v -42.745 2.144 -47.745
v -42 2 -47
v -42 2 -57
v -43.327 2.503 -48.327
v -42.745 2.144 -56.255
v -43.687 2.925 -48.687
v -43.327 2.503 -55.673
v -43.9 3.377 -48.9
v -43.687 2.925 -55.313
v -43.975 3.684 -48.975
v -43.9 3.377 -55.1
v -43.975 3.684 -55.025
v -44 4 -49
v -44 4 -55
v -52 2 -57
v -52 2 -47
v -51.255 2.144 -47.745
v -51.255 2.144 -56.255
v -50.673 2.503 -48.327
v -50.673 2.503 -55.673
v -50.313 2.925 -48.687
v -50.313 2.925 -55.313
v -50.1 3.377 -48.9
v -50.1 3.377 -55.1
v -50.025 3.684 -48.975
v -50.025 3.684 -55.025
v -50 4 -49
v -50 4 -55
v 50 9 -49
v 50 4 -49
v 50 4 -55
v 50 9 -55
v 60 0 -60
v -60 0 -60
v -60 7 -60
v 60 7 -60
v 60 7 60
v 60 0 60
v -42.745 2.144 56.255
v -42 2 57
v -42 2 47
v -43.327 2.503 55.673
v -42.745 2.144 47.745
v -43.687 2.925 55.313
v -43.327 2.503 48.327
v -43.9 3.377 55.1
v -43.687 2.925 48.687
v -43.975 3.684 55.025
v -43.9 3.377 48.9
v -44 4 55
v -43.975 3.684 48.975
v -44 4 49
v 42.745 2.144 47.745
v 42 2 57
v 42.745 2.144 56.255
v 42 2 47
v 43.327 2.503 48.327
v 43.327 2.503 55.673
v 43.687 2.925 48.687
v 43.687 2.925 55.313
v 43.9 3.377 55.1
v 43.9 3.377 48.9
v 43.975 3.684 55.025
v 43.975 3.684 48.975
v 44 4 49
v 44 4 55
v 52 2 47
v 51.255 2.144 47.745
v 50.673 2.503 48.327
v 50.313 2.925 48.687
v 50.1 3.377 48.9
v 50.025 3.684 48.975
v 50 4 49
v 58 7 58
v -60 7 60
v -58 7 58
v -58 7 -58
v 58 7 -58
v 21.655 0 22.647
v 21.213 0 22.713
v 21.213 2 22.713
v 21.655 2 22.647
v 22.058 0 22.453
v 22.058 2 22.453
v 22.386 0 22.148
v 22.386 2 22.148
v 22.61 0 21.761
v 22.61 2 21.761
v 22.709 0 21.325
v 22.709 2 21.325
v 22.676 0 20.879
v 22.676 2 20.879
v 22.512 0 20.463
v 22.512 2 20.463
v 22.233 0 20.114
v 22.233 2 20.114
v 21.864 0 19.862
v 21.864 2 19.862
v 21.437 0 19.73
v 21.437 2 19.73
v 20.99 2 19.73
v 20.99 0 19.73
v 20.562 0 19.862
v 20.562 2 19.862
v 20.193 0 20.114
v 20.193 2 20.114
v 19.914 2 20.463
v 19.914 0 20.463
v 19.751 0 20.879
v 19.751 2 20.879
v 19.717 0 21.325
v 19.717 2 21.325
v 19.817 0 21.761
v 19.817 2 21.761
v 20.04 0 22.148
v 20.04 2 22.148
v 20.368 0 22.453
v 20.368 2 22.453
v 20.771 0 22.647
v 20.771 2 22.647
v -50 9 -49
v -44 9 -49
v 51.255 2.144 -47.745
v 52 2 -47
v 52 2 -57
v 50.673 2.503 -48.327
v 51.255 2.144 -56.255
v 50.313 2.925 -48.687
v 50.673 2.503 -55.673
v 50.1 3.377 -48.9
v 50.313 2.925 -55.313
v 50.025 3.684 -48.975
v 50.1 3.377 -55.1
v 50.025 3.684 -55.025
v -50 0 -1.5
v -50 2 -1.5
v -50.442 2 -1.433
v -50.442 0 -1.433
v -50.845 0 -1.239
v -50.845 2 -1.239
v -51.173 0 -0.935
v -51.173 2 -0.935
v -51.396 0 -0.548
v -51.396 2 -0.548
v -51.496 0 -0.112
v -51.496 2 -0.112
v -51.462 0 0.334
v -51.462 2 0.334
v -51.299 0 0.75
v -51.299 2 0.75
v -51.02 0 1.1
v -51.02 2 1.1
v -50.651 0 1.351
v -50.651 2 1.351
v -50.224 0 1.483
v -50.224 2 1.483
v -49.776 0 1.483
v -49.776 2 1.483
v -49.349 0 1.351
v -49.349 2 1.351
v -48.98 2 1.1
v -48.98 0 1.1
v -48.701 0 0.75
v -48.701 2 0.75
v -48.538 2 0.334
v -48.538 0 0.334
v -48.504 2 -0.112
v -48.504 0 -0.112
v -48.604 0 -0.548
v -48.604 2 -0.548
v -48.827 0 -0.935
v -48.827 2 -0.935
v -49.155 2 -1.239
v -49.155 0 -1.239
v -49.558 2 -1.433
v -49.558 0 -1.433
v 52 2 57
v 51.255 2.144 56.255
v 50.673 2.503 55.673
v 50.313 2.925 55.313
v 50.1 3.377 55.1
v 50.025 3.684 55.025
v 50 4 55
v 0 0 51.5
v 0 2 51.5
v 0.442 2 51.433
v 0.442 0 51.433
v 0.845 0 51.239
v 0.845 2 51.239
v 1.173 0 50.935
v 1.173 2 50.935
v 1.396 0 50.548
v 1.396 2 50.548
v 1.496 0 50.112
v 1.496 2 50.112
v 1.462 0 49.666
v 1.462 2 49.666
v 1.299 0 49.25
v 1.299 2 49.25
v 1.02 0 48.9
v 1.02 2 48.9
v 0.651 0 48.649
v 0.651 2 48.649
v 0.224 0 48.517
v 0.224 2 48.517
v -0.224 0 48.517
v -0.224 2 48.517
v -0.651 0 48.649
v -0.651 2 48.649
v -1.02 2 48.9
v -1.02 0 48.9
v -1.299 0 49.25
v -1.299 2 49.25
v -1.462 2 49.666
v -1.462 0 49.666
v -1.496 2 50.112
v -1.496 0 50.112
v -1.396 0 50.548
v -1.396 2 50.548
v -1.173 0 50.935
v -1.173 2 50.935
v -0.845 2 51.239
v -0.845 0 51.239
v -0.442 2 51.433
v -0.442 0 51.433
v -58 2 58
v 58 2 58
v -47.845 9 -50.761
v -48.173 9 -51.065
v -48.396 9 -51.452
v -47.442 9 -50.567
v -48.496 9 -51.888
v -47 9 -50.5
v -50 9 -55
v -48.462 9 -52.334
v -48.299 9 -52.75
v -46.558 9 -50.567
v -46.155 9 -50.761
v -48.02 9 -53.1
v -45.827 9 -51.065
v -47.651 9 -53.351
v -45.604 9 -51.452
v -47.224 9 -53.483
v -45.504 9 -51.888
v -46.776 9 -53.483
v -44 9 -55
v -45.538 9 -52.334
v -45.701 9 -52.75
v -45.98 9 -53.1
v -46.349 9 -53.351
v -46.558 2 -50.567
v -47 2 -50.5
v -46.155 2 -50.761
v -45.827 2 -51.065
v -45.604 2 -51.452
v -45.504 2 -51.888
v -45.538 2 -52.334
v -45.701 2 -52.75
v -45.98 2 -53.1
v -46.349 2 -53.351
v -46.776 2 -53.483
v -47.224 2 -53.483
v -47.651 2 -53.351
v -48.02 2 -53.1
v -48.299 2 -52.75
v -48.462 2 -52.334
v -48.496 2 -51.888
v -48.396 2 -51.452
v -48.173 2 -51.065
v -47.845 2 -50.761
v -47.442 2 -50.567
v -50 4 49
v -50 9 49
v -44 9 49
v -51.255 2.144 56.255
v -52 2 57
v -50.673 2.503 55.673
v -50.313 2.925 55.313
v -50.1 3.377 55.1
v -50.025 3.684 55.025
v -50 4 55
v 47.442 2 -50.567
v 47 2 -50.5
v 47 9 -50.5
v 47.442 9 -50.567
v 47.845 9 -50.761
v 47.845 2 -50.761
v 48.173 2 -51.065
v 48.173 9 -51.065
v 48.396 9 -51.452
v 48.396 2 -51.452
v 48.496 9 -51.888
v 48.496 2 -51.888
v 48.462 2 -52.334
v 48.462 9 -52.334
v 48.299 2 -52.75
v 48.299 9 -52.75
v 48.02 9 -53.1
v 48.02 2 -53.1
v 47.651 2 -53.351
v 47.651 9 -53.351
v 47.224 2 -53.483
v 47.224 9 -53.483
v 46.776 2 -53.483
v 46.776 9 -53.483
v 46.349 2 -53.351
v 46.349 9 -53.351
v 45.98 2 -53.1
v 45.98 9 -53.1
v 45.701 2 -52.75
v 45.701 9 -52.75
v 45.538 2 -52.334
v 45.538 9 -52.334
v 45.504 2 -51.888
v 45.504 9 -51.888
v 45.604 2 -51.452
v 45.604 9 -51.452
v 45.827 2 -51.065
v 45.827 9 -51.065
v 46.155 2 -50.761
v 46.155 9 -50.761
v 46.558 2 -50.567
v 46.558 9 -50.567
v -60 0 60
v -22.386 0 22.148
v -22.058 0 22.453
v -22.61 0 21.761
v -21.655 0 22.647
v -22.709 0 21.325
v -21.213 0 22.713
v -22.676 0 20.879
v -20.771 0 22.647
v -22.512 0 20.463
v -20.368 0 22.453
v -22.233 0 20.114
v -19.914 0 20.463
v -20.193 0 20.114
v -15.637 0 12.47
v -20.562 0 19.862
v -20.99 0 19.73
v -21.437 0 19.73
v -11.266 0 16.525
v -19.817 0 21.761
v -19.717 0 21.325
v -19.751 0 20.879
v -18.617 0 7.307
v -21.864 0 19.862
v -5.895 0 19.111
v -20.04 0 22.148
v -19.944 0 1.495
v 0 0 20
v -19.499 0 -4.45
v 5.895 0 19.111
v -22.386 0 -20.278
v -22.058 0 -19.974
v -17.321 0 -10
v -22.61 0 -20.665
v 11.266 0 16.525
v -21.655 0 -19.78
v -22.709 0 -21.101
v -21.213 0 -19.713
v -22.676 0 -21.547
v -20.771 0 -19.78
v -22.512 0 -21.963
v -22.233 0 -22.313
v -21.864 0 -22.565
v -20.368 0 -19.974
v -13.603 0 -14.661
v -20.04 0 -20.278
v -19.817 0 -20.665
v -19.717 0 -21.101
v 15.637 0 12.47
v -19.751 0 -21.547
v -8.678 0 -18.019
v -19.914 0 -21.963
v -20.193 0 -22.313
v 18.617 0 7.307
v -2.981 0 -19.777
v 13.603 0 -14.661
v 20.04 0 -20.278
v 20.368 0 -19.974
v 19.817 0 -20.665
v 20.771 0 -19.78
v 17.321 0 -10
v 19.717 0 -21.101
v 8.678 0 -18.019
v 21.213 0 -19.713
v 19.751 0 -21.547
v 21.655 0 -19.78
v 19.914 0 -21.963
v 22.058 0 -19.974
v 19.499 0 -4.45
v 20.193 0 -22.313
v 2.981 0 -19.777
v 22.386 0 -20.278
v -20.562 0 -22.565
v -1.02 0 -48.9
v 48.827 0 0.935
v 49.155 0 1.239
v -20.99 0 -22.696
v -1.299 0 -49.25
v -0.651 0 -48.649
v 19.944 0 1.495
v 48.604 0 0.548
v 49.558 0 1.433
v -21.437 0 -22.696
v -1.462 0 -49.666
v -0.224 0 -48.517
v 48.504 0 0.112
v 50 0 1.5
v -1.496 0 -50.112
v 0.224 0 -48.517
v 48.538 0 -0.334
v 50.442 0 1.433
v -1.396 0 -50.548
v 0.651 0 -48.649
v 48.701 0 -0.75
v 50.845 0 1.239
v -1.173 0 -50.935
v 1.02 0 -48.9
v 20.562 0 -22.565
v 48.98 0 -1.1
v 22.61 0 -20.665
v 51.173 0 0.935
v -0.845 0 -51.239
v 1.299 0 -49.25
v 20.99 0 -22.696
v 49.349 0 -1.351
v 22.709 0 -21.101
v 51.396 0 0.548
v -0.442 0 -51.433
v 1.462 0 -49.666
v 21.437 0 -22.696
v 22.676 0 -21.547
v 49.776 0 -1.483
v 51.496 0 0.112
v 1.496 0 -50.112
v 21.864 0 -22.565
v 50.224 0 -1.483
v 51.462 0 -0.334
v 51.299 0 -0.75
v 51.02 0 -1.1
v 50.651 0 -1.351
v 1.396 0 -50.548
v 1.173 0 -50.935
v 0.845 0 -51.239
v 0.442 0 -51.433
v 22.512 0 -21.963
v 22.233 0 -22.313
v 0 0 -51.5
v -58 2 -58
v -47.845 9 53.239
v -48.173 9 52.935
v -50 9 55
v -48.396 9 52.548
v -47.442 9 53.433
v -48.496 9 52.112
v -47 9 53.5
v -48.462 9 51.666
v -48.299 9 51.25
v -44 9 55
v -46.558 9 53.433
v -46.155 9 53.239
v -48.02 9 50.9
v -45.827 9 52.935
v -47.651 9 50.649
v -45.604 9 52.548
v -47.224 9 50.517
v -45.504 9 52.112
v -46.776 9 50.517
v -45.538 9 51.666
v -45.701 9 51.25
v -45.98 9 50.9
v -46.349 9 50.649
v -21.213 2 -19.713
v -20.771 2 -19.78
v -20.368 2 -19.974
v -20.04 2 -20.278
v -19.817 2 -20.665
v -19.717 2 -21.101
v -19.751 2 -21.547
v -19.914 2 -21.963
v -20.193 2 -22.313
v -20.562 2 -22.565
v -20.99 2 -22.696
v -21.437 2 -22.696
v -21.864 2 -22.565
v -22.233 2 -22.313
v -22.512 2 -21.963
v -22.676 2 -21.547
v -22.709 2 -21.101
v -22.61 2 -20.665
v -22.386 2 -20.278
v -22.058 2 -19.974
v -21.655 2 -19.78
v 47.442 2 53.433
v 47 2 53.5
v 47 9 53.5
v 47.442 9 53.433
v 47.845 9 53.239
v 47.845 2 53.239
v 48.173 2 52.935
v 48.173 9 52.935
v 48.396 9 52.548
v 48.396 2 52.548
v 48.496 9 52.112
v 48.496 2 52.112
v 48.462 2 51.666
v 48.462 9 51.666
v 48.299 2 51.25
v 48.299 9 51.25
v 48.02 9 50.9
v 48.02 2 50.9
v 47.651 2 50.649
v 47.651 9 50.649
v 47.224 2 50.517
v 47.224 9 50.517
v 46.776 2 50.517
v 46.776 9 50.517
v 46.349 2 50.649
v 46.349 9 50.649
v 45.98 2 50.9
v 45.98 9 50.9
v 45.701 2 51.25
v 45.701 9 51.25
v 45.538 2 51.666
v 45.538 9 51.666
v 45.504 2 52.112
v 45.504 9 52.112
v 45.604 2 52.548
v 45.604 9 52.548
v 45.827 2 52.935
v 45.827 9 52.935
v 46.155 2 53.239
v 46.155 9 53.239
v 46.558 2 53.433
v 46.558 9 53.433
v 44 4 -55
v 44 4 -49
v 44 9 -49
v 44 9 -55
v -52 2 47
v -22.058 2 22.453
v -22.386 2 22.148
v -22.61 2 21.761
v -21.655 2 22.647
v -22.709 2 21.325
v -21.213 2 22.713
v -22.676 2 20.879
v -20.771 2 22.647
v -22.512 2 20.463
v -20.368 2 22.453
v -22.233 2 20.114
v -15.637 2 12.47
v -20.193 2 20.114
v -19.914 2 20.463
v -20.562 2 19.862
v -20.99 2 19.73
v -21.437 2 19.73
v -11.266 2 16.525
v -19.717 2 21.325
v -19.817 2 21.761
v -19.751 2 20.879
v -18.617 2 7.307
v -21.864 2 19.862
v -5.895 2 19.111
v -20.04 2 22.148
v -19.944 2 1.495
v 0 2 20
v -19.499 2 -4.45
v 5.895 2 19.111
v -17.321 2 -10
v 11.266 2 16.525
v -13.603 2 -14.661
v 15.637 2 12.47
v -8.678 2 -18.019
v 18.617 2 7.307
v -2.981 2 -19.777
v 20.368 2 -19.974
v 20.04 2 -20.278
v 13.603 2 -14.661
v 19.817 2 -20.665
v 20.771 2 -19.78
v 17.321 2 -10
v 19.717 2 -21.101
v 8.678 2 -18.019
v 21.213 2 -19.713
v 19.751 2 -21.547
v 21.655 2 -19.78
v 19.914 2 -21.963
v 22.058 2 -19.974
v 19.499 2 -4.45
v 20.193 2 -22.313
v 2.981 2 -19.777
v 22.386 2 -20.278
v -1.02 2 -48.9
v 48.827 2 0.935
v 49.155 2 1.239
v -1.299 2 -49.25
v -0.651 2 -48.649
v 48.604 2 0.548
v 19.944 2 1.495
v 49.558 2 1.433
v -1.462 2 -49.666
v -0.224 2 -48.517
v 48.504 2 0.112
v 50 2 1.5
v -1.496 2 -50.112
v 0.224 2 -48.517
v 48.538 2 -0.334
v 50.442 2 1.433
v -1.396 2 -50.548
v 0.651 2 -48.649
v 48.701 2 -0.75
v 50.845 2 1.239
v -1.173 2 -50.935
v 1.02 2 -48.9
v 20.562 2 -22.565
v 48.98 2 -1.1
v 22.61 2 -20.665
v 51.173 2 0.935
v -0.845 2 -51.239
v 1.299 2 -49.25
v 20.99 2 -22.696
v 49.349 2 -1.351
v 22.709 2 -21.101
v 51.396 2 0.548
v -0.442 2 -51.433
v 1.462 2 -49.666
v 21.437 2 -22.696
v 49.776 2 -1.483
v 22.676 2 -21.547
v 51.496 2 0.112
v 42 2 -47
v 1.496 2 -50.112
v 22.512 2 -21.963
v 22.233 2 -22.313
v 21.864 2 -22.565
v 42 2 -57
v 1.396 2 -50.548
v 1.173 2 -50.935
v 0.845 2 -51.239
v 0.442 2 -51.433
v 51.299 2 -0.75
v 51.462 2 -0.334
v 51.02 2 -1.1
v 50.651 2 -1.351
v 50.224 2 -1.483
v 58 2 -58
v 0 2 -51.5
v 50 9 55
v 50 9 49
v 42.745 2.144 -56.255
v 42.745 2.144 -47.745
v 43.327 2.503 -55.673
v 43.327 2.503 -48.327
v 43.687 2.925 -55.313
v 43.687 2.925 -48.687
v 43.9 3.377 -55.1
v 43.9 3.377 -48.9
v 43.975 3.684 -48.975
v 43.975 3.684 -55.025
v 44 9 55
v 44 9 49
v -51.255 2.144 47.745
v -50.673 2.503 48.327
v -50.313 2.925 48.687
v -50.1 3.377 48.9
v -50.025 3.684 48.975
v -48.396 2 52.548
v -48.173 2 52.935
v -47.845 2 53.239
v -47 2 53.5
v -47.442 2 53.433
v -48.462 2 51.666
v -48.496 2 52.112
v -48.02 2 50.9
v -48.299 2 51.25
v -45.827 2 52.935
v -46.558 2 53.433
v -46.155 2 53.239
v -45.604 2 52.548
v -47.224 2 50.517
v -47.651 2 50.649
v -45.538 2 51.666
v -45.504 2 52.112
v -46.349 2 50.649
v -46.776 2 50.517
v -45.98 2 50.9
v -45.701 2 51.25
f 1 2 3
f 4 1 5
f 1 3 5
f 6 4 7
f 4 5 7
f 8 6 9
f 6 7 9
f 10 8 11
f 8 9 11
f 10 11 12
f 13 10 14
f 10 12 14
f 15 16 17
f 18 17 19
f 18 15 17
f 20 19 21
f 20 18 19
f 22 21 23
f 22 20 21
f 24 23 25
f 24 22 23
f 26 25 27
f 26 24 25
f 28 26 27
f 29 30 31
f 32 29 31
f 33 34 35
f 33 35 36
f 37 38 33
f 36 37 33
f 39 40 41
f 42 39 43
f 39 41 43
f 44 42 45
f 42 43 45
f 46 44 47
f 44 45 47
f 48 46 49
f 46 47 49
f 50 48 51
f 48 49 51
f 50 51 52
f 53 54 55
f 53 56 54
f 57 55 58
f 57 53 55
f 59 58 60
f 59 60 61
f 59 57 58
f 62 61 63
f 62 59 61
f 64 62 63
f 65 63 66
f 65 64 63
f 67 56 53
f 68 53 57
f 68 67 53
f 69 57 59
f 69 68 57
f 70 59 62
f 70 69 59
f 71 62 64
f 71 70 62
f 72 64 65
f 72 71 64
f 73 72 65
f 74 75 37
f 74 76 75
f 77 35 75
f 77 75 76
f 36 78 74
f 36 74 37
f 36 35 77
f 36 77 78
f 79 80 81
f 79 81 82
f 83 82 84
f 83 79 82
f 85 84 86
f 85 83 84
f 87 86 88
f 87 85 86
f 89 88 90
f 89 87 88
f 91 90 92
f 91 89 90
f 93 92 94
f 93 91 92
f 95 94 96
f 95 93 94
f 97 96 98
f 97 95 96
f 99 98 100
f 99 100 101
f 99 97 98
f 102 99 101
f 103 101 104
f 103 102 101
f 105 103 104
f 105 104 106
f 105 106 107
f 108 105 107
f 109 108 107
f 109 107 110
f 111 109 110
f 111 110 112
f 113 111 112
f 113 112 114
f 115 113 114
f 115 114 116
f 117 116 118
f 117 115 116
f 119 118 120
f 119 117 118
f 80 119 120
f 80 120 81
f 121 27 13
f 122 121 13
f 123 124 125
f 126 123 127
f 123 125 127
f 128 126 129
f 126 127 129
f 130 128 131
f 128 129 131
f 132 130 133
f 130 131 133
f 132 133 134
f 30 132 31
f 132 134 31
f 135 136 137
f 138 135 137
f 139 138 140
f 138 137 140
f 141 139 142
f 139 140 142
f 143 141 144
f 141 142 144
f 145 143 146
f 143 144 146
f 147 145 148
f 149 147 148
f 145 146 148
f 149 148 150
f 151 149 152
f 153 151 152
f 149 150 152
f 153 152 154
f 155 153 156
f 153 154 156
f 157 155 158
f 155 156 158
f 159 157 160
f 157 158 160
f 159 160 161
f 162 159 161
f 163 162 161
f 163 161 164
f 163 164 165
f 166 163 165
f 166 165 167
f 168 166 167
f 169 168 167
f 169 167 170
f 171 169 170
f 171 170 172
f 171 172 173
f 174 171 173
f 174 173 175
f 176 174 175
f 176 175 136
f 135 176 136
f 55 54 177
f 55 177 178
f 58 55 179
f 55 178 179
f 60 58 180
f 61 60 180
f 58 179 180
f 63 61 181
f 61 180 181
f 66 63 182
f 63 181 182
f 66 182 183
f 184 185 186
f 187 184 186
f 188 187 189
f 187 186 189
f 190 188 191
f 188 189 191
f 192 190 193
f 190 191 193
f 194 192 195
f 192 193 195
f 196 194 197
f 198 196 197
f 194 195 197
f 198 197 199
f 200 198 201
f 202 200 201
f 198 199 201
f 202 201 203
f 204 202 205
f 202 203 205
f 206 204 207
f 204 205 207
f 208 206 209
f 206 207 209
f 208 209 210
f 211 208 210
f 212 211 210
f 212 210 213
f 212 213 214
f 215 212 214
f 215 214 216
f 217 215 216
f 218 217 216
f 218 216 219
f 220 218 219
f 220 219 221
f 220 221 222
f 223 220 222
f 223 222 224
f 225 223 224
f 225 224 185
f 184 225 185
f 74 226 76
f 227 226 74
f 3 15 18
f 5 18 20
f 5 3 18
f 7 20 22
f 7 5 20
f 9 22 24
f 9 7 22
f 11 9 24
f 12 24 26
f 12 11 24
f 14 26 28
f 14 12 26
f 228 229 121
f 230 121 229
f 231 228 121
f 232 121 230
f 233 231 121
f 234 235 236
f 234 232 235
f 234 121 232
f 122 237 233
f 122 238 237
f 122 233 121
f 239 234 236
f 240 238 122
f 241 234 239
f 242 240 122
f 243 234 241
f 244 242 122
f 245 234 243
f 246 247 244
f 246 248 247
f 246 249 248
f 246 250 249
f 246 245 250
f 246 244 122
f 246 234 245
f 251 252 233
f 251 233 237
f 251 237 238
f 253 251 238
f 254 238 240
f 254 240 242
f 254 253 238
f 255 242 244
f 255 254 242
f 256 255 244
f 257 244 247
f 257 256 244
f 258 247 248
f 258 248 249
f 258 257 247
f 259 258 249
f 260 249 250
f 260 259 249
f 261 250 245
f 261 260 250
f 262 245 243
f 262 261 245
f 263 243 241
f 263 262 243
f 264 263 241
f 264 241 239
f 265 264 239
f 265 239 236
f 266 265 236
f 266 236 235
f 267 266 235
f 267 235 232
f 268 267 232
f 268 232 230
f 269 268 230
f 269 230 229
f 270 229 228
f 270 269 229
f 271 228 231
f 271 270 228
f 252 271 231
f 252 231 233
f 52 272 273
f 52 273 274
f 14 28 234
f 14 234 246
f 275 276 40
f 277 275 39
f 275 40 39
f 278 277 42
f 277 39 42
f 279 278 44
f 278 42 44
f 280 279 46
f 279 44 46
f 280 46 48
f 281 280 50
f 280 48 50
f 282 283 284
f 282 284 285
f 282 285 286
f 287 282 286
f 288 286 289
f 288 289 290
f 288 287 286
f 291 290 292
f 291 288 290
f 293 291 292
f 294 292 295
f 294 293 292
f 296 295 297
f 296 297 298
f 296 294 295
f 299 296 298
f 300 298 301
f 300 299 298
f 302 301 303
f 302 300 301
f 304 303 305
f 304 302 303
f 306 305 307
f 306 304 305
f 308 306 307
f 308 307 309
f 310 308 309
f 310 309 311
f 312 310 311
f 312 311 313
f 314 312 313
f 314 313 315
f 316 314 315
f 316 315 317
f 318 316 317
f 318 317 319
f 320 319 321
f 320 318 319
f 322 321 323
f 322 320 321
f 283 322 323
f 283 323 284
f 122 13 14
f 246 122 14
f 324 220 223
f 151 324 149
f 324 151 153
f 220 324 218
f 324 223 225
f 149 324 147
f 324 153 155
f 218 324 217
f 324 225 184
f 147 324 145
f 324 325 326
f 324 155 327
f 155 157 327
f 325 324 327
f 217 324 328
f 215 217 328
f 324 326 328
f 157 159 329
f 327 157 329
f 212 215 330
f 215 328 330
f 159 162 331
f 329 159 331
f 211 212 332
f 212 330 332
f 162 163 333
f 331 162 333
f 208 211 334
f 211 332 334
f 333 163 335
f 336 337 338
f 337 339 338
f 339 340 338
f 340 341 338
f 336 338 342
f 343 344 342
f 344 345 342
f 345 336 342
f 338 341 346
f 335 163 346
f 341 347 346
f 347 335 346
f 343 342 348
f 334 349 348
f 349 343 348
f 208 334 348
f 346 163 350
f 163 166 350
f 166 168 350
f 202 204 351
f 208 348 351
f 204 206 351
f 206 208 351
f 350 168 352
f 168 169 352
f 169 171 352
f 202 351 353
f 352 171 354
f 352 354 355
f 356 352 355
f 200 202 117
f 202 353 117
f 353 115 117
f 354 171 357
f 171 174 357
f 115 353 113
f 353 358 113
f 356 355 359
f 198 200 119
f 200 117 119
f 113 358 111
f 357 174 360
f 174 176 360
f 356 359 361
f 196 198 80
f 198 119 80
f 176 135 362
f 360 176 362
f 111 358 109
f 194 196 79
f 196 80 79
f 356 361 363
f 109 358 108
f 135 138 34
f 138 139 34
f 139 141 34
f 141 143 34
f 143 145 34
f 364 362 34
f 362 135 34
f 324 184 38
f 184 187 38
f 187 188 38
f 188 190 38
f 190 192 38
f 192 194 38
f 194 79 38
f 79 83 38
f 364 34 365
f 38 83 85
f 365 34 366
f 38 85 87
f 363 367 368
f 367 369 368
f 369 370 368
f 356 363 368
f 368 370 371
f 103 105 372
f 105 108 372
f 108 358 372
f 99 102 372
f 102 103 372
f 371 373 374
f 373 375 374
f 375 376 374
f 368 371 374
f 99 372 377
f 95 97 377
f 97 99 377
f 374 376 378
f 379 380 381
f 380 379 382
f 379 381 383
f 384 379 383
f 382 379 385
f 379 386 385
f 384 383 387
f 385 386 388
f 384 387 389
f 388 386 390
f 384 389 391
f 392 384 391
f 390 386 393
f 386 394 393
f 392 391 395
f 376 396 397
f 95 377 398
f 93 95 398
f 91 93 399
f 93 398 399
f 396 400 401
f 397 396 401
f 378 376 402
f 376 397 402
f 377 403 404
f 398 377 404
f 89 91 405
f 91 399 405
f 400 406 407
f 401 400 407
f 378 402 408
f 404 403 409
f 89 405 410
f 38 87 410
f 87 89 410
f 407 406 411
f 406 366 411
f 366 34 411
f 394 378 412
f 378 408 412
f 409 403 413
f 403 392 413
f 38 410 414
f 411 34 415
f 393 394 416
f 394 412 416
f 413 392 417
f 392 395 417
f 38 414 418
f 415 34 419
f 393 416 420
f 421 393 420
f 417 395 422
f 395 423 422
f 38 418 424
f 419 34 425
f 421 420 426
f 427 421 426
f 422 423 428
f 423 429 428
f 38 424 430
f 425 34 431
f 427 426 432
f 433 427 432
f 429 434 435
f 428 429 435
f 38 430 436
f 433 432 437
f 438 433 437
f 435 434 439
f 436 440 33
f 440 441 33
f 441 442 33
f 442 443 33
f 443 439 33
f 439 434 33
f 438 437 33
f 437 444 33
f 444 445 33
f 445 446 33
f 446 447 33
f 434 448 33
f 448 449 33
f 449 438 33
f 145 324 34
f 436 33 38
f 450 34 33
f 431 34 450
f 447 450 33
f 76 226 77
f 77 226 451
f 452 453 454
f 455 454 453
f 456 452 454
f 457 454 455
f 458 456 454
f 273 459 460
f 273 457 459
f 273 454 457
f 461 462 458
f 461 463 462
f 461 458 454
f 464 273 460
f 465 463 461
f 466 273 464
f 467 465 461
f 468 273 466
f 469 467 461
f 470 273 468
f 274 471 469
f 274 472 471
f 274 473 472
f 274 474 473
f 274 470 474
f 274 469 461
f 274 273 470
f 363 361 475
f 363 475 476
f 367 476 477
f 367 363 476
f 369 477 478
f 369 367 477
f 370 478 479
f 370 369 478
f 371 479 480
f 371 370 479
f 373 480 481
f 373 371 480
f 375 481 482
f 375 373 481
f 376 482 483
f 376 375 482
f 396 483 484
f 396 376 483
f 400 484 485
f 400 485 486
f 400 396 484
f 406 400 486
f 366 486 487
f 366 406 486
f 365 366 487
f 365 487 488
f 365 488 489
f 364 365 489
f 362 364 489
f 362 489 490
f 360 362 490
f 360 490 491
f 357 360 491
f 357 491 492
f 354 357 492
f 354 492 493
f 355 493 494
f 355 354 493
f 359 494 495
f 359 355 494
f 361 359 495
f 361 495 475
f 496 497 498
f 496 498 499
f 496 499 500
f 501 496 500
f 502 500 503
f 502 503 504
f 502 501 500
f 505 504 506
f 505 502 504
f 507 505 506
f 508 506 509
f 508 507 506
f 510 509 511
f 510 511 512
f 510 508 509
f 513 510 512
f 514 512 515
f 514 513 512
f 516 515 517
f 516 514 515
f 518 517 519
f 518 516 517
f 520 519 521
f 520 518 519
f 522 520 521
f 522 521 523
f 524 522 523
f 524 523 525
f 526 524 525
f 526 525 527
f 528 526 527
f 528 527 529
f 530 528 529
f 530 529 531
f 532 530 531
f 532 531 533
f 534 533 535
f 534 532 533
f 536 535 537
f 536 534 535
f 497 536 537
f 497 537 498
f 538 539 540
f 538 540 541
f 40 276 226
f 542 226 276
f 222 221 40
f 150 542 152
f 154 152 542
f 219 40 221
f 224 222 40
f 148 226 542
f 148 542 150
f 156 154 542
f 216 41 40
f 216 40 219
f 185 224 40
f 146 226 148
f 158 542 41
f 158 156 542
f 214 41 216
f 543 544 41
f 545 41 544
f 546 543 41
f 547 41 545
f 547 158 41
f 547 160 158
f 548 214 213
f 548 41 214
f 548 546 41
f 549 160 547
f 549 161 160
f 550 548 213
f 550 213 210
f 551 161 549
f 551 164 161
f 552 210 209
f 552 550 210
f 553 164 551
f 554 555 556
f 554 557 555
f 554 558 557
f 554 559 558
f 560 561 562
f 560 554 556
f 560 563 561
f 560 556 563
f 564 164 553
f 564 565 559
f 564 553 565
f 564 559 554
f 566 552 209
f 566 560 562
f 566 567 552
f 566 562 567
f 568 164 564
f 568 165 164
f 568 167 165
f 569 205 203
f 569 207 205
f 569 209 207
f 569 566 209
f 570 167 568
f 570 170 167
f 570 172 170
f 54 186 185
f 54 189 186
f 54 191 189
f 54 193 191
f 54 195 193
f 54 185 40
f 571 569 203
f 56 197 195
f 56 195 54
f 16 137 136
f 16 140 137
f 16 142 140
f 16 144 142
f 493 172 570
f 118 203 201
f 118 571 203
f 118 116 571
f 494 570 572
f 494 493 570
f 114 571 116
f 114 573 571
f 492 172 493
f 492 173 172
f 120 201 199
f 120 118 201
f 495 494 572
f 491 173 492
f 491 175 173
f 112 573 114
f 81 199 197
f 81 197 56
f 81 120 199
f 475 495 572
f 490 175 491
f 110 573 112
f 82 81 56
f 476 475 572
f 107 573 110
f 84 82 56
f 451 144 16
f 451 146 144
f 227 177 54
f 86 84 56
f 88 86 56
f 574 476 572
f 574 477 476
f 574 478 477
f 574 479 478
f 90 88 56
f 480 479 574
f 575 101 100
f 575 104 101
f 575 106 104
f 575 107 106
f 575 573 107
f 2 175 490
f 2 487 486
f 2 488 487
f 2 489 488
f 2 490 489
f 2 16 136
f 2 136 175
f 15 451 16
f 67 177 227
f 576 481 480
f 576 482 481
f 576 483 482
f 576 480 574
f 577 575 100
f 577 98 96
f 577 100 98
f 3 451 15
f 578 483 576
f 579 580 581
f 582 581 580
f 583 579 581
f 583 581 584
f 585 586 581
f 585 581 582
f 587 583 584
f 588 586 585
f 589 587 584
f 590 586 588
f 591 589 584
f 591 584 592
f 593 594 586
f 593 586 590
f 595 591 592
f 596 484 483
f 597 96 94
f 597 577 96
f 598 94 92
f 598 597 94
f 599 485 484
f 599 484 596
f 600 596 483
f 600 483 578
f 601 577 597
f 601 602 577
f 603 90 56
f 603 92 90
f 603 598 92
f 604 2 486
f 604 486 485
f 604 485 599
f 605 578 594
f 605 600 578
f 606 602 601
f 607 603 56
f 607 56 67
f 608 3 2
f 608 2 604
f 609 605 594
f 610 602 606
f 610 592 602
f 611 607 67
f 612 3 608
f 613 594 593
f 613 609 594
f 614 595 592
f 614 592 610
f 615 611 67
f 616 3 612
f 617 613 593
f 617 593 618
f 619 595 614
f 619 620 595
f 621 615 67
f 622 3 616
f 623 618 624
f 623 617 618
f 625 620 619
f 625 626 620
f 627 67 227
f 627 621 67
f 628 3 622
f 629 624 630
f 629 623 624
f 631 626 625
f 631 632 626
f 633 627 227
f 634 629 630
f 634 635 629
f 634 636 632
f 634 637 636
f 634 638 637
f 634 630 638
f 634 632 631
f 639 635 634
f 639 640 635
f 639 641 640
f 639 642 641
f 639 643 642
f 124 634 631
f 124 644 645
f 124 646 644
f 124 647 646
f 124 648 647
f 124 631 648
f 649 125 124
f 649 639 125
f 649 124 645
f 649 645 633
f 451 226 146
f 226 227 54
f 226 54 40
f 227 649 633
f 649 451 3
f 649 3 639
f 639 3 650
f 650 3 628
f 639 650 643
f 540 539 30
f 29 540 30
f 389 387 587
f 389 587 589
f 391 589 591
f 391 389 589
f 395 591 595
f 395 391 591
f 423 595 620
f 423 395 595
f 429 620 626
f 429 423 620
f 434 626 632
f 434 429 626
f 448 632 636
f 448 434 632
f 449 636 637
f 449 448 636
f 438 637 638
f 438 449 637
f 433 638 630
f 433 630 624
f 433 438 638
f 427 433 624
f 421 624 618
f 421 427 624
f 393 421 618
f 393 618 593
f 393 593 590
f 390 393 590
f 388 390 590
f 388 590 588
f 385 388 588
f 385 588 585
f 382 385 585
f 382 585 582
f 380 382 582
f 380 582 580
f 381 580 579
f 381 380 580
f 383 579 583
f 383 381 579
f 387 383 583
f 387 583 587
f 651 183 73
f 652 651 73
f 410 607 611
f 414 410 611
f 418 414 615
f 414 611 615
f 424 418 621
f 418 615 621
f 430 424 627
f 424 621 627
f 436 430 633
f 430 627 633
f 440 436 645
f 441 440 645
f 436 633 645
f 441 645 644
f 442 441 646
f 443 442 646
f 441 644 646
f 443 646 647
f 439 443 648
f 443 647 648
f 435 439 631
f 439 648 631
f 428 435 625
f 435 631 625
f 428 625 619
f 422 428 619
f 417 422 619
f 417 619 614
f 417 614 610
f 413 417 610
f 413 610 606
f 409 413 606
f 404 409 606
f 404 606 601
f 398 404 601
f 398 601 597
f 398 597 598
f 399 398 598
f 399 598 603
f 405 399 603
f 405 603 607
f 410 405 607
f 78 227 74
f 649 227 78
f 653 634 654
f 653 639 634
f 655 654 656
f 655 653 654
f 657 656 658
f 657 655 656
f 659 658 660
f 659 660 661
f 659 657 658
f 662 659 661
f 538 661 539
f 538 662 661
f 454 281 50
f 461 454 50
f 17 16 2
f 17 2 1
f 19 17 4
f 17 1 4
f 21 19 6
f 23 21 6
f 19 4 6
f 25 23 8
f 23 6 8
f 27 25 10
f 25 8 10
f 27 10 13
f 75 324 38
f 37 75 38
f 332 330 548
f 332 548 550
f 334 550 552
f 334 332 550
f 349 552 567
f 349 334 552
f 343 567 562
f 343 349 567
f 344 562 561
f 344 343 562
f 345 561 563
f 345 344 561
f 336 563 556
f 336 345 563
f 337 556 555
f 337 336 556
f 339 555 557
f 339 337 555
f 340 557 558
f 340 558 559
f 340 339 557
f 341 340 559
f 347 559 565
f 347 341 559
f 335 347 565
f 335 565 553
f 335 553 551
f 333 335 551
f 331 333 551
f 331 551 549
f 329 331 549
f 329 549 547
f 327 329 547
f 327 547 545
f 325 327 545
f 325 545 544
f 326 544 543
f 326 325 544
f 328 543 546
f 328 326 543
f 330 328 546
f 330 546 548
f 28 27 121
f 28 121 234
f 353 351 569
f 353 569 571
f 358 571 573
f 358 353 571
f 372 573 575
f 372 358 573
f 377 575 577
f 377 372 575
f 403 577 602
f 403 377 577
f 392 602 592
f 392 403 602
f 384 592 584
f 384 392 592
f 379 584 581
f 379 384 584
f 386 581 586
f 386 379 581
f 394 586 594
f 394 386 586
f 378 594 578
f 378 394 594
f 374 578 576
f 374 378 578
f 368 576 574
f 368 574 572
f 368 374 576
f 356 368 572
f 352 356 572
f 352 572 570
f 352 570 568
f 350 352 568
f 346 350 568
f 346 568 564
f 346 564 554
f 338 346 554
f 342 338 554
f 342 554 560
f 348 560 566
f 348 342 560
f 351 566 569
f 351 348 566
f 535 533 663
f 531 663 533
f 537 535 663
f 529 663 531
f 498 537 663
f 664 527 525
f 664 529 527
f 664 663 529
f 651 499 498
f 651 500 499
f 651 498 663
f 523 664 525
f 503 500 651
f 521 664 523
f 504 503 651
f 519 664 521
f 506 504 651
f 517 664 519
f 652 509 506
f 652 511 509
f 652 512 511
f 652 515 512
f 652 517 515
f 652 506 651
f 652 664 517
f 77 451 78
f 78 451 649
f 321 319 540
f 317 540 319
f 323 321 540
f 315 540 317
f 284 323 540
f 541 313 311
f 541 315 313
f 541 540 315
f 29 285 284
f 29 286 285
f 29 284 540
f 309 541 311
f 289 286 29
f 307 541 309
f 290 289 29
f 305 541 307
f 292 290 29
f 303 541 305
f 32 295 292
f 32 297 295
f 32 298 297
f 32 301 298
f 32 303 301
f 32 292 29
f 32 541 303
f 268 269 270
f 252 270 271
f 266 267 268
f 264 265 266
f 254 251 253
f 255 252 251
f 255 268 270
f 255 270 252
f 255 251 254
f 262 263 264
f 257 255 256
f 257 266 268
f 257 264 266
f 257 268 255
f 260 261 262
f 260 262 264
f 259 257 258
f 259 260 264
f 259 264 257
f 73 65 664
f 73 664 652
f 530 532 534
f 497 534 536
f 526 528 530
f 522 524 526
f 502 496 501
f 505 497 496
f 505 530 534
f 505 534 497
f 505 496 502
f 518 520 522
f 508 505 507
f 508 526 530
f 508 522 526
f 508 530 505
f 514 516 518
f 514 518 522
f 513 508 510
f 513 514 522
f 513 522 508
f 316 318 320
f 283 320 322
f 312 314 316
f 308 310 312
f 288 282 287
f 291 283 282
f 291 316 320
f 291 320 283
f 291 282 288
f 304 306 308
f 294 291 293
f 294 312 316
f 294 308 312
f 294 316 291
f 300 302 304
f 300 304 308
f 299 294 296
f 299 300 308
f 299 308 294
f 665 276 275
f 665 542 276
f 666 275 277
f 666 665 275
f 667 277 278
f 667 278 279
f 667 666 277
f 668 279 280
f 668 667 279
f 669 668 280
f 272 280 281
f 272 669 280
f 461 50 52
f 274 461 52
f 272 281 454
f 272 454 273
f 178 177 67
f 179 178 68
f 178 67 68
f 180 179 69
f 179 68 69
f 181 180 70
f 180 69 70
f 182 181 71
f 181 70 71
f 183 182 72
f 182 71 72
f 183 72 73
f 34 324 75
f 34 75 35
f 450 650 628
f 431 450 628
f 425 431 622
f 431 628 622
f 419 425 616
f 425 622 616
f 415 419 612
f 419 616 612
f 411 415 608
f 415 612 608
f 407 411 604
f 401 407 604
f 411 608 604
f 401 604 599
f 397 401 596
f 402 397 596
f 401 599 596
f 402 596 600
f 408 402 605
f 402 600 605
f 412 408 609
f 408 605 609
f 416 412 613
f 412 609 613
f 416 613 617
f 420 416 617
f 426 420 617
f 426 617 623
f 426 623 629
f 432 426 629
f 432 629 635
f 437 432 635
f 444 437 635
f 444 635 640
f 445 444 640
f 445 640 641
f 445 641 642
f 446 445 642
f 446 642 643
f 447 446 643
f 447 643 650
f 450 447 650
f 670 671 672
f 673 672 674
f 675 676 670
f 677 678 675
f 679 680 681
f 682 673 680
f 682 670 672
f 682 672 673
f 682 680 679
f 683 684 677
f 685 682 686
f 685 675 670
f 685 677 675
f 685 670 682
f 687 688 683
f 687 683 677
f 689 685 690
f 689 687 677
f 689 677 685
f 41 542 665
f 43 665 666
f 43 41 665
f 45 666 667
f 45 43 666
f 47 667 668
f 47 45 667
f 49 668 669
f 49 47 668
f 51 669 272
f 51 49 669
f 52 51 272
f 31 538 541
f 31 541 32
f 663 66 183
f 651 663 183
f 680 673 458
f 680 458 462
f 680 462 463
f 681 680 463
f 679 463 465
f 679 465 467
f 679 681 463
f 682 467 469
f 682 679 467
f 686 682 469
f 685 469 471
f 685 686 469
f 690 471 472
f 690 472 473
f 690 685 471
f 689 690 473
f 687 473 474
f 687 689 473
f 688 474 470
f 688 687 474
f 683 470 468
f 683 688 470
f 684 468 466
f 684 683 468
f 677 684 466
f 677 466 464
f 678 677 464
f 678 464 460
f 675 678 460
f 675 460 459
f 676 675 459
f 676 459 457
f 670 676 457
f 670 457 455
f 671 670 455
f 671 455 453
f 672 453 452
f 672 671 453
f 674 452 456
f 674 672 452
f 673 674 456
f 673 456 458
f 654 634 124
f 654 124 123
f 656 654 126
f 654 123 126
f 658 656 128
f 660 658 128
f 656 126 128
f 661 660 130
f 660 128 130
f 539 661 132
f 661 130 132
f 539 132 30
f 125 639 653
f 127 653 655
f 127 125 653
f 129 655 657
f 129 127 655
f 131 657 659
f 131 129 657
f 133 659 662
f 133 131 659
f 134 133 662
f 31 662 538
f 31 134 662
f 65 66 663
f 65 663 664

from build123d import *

# Parameters (mm, degrees)
SKETCH1_W           = 116
SKETCH1_H           = 116
SKETCH1_R           = 1.5
SKETCH1_R_2         = 20
BOSS_EXTRUDE1_DEPTH = 2
SKETCH2_W           = 6
SKETCH2_H           = 6
SKETCH2_R           = 1.5
BOSS_EXTRUDE2_DEPTH = 7
SKETCH1_4_W         = 120
SKETCH1_4_H         = 120
SKETCH1_4_W_2       = 116
SKETCH1_4_H_2       = 116
BOSS_EXTRUDE3_DEPTH = 7
SKETCH3_R           = 1.5
CUT_EXTRUDE1_DEPTH  = 86.141059425
FILLET2_R           = 2


with BuildPart() as part:
    # Sketch1 → Boss-Extrude1 (new body)
    with BuildSketch(Plane(origin=(0, 0, 0), x_dir=(1, 0, 0), z_dir=(0, 1, 0))):
        Rectangle(SKETCH1_W, SKETCH1_H)
        with Locations((-21.213203436, -21.213203436)):
            Circle(SKETCH1_R, mode=Mode.SUBTRACT)
        with Locations((21.213203436, -21.213203436)):
            Circle(SKETCH1_R, mode=Mode.SUBTRACT)
        Circle(SKETCH1_R_2, mode=Mode.SUBTRACT)
        with Locations((-21.213203436, 21.213203436)):
            Circle(SKETCH1_R, mode=Mode.SUBTRACT)
        with Locations((21.213203436, 21.213203436)):
            Circle(SKETCH1_R, mode=Mode.SUBTRACT)
    extrude(amount=BOSS_EXTRUDE1_DEPTH)

    # Sketch2 → Boss-Extrude2 (add)
    # profile 1 of 4: a face of its own
    with BuildSketch(Plane(origin=(0, 2, 0), x_dir=(1, 0, 0), z_dir=(0, 1, 0))):
        with Locations((47, 52)):
            Rectangle(SKETCH2_W, SKETCH2_H)
        with Locations((47, 52)):
            Circle(SKETCH2_R, mode=Mode.SUBTRACT)
    # profile 2 of 4: a face of its own
    with BuildSketch(Plane(origin=(0, 2, 0), x_dir=(1, 0, 0), z_dir=(0, 1, 0))):
        with Locations((47, -52)):
            Rectangle(SKETCH2_W, SKETCH2_H)
        with Locations((47, -52)):
            Circle(SKETCH2_R, mode=Mode.SUBTRACT)
    # profile 3 of 4: a face of its own
    with BuildSketch(Plane(origin=(0, 2, 0), x_dir=(1, 0, 0), z_dir=(0, 1, 0))):
        with Locations((-47, 52)):
            Rectangle(SKETCH2_W, SKETCH2_H)
        with Locations((-47, 52)):
            Circle(SKETCH2_R, mode=Mode.SUBTRACT)
    # profile 4 of 4: a face of its own
    with BuildSketch(Plane(origin=(0, 2, 0), x_dir=(1, 0, 0), z_dir=(0, 1, 0))):
        with Locations((-47, -52)):
            Rectangle(SKETCH2_W, SKETCH2_H)
        with Locations((-47, -52)):
            Circle(SKETCH2_R, mode=Mode.SUBTRACT)
    extrude(amount=BOSS_EXTRUDE2_DEPTH)

    # Sketch1<4> → Boss-Extrude3 (add)
    with BuildSketch(Plane(origin=(0, 0, 0), x_dir=(1, 0, 0), z_dir=(0, 1, 0))):
        Rectangle(SKETCH1_4_W, SKETCH1_4_H)
        Rectangle(SKETCH1_4_W_2, SKETCH1_4_H_2, mode=Mode.SUBTRACT)
    extrude(amount=BOSS_EXTRUDE3_DEPTH)

    # Sketch3 → Cut-Extrude1 (cut, through all)
    with BuildSketch(Plane(origin=(0, 2, 0), x_dir=(1, 0, 0), z_dir=(0, 1, 0))):
        with Locations((50, 0)):
            Circle(SKETCH3_R)
        with Locations((-50, 0)):
            Circle(SKETCH3_R)
        with Locations((0, -50)):
            Circle(SKETCH3_R)
        with Locations((0, 50)):
            Circle(SKETCH3_R)
    extrude(amount=-CUT_EXTRUDE1_DEPTH, mode=Mode.SUBTRACT)

    # Fillet2
    fillet2_edges = [part.edges().sort_by_distance(p)[0] for p in [
        (-47, 2, 49),
        (-50, 2, 52),
        (-47, 2, 55),
        (-44, 2, 52),
        (50, 2, 52),
        (47, 2, 55),
        (47, 2, 49),
        (44, 2, 52),
        (47, 2, -55),
        (44, 2, -52),
        (47, 2, -49),
        (50, 2, -52),
        (-47, 2, -55),
        (-44, 2, -52),
        (-50, 2, -52),
        (-47, 2, -49),
    ]]
    fillet(fillet2_edges, radius=FILLET2_R)


solid = part.part
